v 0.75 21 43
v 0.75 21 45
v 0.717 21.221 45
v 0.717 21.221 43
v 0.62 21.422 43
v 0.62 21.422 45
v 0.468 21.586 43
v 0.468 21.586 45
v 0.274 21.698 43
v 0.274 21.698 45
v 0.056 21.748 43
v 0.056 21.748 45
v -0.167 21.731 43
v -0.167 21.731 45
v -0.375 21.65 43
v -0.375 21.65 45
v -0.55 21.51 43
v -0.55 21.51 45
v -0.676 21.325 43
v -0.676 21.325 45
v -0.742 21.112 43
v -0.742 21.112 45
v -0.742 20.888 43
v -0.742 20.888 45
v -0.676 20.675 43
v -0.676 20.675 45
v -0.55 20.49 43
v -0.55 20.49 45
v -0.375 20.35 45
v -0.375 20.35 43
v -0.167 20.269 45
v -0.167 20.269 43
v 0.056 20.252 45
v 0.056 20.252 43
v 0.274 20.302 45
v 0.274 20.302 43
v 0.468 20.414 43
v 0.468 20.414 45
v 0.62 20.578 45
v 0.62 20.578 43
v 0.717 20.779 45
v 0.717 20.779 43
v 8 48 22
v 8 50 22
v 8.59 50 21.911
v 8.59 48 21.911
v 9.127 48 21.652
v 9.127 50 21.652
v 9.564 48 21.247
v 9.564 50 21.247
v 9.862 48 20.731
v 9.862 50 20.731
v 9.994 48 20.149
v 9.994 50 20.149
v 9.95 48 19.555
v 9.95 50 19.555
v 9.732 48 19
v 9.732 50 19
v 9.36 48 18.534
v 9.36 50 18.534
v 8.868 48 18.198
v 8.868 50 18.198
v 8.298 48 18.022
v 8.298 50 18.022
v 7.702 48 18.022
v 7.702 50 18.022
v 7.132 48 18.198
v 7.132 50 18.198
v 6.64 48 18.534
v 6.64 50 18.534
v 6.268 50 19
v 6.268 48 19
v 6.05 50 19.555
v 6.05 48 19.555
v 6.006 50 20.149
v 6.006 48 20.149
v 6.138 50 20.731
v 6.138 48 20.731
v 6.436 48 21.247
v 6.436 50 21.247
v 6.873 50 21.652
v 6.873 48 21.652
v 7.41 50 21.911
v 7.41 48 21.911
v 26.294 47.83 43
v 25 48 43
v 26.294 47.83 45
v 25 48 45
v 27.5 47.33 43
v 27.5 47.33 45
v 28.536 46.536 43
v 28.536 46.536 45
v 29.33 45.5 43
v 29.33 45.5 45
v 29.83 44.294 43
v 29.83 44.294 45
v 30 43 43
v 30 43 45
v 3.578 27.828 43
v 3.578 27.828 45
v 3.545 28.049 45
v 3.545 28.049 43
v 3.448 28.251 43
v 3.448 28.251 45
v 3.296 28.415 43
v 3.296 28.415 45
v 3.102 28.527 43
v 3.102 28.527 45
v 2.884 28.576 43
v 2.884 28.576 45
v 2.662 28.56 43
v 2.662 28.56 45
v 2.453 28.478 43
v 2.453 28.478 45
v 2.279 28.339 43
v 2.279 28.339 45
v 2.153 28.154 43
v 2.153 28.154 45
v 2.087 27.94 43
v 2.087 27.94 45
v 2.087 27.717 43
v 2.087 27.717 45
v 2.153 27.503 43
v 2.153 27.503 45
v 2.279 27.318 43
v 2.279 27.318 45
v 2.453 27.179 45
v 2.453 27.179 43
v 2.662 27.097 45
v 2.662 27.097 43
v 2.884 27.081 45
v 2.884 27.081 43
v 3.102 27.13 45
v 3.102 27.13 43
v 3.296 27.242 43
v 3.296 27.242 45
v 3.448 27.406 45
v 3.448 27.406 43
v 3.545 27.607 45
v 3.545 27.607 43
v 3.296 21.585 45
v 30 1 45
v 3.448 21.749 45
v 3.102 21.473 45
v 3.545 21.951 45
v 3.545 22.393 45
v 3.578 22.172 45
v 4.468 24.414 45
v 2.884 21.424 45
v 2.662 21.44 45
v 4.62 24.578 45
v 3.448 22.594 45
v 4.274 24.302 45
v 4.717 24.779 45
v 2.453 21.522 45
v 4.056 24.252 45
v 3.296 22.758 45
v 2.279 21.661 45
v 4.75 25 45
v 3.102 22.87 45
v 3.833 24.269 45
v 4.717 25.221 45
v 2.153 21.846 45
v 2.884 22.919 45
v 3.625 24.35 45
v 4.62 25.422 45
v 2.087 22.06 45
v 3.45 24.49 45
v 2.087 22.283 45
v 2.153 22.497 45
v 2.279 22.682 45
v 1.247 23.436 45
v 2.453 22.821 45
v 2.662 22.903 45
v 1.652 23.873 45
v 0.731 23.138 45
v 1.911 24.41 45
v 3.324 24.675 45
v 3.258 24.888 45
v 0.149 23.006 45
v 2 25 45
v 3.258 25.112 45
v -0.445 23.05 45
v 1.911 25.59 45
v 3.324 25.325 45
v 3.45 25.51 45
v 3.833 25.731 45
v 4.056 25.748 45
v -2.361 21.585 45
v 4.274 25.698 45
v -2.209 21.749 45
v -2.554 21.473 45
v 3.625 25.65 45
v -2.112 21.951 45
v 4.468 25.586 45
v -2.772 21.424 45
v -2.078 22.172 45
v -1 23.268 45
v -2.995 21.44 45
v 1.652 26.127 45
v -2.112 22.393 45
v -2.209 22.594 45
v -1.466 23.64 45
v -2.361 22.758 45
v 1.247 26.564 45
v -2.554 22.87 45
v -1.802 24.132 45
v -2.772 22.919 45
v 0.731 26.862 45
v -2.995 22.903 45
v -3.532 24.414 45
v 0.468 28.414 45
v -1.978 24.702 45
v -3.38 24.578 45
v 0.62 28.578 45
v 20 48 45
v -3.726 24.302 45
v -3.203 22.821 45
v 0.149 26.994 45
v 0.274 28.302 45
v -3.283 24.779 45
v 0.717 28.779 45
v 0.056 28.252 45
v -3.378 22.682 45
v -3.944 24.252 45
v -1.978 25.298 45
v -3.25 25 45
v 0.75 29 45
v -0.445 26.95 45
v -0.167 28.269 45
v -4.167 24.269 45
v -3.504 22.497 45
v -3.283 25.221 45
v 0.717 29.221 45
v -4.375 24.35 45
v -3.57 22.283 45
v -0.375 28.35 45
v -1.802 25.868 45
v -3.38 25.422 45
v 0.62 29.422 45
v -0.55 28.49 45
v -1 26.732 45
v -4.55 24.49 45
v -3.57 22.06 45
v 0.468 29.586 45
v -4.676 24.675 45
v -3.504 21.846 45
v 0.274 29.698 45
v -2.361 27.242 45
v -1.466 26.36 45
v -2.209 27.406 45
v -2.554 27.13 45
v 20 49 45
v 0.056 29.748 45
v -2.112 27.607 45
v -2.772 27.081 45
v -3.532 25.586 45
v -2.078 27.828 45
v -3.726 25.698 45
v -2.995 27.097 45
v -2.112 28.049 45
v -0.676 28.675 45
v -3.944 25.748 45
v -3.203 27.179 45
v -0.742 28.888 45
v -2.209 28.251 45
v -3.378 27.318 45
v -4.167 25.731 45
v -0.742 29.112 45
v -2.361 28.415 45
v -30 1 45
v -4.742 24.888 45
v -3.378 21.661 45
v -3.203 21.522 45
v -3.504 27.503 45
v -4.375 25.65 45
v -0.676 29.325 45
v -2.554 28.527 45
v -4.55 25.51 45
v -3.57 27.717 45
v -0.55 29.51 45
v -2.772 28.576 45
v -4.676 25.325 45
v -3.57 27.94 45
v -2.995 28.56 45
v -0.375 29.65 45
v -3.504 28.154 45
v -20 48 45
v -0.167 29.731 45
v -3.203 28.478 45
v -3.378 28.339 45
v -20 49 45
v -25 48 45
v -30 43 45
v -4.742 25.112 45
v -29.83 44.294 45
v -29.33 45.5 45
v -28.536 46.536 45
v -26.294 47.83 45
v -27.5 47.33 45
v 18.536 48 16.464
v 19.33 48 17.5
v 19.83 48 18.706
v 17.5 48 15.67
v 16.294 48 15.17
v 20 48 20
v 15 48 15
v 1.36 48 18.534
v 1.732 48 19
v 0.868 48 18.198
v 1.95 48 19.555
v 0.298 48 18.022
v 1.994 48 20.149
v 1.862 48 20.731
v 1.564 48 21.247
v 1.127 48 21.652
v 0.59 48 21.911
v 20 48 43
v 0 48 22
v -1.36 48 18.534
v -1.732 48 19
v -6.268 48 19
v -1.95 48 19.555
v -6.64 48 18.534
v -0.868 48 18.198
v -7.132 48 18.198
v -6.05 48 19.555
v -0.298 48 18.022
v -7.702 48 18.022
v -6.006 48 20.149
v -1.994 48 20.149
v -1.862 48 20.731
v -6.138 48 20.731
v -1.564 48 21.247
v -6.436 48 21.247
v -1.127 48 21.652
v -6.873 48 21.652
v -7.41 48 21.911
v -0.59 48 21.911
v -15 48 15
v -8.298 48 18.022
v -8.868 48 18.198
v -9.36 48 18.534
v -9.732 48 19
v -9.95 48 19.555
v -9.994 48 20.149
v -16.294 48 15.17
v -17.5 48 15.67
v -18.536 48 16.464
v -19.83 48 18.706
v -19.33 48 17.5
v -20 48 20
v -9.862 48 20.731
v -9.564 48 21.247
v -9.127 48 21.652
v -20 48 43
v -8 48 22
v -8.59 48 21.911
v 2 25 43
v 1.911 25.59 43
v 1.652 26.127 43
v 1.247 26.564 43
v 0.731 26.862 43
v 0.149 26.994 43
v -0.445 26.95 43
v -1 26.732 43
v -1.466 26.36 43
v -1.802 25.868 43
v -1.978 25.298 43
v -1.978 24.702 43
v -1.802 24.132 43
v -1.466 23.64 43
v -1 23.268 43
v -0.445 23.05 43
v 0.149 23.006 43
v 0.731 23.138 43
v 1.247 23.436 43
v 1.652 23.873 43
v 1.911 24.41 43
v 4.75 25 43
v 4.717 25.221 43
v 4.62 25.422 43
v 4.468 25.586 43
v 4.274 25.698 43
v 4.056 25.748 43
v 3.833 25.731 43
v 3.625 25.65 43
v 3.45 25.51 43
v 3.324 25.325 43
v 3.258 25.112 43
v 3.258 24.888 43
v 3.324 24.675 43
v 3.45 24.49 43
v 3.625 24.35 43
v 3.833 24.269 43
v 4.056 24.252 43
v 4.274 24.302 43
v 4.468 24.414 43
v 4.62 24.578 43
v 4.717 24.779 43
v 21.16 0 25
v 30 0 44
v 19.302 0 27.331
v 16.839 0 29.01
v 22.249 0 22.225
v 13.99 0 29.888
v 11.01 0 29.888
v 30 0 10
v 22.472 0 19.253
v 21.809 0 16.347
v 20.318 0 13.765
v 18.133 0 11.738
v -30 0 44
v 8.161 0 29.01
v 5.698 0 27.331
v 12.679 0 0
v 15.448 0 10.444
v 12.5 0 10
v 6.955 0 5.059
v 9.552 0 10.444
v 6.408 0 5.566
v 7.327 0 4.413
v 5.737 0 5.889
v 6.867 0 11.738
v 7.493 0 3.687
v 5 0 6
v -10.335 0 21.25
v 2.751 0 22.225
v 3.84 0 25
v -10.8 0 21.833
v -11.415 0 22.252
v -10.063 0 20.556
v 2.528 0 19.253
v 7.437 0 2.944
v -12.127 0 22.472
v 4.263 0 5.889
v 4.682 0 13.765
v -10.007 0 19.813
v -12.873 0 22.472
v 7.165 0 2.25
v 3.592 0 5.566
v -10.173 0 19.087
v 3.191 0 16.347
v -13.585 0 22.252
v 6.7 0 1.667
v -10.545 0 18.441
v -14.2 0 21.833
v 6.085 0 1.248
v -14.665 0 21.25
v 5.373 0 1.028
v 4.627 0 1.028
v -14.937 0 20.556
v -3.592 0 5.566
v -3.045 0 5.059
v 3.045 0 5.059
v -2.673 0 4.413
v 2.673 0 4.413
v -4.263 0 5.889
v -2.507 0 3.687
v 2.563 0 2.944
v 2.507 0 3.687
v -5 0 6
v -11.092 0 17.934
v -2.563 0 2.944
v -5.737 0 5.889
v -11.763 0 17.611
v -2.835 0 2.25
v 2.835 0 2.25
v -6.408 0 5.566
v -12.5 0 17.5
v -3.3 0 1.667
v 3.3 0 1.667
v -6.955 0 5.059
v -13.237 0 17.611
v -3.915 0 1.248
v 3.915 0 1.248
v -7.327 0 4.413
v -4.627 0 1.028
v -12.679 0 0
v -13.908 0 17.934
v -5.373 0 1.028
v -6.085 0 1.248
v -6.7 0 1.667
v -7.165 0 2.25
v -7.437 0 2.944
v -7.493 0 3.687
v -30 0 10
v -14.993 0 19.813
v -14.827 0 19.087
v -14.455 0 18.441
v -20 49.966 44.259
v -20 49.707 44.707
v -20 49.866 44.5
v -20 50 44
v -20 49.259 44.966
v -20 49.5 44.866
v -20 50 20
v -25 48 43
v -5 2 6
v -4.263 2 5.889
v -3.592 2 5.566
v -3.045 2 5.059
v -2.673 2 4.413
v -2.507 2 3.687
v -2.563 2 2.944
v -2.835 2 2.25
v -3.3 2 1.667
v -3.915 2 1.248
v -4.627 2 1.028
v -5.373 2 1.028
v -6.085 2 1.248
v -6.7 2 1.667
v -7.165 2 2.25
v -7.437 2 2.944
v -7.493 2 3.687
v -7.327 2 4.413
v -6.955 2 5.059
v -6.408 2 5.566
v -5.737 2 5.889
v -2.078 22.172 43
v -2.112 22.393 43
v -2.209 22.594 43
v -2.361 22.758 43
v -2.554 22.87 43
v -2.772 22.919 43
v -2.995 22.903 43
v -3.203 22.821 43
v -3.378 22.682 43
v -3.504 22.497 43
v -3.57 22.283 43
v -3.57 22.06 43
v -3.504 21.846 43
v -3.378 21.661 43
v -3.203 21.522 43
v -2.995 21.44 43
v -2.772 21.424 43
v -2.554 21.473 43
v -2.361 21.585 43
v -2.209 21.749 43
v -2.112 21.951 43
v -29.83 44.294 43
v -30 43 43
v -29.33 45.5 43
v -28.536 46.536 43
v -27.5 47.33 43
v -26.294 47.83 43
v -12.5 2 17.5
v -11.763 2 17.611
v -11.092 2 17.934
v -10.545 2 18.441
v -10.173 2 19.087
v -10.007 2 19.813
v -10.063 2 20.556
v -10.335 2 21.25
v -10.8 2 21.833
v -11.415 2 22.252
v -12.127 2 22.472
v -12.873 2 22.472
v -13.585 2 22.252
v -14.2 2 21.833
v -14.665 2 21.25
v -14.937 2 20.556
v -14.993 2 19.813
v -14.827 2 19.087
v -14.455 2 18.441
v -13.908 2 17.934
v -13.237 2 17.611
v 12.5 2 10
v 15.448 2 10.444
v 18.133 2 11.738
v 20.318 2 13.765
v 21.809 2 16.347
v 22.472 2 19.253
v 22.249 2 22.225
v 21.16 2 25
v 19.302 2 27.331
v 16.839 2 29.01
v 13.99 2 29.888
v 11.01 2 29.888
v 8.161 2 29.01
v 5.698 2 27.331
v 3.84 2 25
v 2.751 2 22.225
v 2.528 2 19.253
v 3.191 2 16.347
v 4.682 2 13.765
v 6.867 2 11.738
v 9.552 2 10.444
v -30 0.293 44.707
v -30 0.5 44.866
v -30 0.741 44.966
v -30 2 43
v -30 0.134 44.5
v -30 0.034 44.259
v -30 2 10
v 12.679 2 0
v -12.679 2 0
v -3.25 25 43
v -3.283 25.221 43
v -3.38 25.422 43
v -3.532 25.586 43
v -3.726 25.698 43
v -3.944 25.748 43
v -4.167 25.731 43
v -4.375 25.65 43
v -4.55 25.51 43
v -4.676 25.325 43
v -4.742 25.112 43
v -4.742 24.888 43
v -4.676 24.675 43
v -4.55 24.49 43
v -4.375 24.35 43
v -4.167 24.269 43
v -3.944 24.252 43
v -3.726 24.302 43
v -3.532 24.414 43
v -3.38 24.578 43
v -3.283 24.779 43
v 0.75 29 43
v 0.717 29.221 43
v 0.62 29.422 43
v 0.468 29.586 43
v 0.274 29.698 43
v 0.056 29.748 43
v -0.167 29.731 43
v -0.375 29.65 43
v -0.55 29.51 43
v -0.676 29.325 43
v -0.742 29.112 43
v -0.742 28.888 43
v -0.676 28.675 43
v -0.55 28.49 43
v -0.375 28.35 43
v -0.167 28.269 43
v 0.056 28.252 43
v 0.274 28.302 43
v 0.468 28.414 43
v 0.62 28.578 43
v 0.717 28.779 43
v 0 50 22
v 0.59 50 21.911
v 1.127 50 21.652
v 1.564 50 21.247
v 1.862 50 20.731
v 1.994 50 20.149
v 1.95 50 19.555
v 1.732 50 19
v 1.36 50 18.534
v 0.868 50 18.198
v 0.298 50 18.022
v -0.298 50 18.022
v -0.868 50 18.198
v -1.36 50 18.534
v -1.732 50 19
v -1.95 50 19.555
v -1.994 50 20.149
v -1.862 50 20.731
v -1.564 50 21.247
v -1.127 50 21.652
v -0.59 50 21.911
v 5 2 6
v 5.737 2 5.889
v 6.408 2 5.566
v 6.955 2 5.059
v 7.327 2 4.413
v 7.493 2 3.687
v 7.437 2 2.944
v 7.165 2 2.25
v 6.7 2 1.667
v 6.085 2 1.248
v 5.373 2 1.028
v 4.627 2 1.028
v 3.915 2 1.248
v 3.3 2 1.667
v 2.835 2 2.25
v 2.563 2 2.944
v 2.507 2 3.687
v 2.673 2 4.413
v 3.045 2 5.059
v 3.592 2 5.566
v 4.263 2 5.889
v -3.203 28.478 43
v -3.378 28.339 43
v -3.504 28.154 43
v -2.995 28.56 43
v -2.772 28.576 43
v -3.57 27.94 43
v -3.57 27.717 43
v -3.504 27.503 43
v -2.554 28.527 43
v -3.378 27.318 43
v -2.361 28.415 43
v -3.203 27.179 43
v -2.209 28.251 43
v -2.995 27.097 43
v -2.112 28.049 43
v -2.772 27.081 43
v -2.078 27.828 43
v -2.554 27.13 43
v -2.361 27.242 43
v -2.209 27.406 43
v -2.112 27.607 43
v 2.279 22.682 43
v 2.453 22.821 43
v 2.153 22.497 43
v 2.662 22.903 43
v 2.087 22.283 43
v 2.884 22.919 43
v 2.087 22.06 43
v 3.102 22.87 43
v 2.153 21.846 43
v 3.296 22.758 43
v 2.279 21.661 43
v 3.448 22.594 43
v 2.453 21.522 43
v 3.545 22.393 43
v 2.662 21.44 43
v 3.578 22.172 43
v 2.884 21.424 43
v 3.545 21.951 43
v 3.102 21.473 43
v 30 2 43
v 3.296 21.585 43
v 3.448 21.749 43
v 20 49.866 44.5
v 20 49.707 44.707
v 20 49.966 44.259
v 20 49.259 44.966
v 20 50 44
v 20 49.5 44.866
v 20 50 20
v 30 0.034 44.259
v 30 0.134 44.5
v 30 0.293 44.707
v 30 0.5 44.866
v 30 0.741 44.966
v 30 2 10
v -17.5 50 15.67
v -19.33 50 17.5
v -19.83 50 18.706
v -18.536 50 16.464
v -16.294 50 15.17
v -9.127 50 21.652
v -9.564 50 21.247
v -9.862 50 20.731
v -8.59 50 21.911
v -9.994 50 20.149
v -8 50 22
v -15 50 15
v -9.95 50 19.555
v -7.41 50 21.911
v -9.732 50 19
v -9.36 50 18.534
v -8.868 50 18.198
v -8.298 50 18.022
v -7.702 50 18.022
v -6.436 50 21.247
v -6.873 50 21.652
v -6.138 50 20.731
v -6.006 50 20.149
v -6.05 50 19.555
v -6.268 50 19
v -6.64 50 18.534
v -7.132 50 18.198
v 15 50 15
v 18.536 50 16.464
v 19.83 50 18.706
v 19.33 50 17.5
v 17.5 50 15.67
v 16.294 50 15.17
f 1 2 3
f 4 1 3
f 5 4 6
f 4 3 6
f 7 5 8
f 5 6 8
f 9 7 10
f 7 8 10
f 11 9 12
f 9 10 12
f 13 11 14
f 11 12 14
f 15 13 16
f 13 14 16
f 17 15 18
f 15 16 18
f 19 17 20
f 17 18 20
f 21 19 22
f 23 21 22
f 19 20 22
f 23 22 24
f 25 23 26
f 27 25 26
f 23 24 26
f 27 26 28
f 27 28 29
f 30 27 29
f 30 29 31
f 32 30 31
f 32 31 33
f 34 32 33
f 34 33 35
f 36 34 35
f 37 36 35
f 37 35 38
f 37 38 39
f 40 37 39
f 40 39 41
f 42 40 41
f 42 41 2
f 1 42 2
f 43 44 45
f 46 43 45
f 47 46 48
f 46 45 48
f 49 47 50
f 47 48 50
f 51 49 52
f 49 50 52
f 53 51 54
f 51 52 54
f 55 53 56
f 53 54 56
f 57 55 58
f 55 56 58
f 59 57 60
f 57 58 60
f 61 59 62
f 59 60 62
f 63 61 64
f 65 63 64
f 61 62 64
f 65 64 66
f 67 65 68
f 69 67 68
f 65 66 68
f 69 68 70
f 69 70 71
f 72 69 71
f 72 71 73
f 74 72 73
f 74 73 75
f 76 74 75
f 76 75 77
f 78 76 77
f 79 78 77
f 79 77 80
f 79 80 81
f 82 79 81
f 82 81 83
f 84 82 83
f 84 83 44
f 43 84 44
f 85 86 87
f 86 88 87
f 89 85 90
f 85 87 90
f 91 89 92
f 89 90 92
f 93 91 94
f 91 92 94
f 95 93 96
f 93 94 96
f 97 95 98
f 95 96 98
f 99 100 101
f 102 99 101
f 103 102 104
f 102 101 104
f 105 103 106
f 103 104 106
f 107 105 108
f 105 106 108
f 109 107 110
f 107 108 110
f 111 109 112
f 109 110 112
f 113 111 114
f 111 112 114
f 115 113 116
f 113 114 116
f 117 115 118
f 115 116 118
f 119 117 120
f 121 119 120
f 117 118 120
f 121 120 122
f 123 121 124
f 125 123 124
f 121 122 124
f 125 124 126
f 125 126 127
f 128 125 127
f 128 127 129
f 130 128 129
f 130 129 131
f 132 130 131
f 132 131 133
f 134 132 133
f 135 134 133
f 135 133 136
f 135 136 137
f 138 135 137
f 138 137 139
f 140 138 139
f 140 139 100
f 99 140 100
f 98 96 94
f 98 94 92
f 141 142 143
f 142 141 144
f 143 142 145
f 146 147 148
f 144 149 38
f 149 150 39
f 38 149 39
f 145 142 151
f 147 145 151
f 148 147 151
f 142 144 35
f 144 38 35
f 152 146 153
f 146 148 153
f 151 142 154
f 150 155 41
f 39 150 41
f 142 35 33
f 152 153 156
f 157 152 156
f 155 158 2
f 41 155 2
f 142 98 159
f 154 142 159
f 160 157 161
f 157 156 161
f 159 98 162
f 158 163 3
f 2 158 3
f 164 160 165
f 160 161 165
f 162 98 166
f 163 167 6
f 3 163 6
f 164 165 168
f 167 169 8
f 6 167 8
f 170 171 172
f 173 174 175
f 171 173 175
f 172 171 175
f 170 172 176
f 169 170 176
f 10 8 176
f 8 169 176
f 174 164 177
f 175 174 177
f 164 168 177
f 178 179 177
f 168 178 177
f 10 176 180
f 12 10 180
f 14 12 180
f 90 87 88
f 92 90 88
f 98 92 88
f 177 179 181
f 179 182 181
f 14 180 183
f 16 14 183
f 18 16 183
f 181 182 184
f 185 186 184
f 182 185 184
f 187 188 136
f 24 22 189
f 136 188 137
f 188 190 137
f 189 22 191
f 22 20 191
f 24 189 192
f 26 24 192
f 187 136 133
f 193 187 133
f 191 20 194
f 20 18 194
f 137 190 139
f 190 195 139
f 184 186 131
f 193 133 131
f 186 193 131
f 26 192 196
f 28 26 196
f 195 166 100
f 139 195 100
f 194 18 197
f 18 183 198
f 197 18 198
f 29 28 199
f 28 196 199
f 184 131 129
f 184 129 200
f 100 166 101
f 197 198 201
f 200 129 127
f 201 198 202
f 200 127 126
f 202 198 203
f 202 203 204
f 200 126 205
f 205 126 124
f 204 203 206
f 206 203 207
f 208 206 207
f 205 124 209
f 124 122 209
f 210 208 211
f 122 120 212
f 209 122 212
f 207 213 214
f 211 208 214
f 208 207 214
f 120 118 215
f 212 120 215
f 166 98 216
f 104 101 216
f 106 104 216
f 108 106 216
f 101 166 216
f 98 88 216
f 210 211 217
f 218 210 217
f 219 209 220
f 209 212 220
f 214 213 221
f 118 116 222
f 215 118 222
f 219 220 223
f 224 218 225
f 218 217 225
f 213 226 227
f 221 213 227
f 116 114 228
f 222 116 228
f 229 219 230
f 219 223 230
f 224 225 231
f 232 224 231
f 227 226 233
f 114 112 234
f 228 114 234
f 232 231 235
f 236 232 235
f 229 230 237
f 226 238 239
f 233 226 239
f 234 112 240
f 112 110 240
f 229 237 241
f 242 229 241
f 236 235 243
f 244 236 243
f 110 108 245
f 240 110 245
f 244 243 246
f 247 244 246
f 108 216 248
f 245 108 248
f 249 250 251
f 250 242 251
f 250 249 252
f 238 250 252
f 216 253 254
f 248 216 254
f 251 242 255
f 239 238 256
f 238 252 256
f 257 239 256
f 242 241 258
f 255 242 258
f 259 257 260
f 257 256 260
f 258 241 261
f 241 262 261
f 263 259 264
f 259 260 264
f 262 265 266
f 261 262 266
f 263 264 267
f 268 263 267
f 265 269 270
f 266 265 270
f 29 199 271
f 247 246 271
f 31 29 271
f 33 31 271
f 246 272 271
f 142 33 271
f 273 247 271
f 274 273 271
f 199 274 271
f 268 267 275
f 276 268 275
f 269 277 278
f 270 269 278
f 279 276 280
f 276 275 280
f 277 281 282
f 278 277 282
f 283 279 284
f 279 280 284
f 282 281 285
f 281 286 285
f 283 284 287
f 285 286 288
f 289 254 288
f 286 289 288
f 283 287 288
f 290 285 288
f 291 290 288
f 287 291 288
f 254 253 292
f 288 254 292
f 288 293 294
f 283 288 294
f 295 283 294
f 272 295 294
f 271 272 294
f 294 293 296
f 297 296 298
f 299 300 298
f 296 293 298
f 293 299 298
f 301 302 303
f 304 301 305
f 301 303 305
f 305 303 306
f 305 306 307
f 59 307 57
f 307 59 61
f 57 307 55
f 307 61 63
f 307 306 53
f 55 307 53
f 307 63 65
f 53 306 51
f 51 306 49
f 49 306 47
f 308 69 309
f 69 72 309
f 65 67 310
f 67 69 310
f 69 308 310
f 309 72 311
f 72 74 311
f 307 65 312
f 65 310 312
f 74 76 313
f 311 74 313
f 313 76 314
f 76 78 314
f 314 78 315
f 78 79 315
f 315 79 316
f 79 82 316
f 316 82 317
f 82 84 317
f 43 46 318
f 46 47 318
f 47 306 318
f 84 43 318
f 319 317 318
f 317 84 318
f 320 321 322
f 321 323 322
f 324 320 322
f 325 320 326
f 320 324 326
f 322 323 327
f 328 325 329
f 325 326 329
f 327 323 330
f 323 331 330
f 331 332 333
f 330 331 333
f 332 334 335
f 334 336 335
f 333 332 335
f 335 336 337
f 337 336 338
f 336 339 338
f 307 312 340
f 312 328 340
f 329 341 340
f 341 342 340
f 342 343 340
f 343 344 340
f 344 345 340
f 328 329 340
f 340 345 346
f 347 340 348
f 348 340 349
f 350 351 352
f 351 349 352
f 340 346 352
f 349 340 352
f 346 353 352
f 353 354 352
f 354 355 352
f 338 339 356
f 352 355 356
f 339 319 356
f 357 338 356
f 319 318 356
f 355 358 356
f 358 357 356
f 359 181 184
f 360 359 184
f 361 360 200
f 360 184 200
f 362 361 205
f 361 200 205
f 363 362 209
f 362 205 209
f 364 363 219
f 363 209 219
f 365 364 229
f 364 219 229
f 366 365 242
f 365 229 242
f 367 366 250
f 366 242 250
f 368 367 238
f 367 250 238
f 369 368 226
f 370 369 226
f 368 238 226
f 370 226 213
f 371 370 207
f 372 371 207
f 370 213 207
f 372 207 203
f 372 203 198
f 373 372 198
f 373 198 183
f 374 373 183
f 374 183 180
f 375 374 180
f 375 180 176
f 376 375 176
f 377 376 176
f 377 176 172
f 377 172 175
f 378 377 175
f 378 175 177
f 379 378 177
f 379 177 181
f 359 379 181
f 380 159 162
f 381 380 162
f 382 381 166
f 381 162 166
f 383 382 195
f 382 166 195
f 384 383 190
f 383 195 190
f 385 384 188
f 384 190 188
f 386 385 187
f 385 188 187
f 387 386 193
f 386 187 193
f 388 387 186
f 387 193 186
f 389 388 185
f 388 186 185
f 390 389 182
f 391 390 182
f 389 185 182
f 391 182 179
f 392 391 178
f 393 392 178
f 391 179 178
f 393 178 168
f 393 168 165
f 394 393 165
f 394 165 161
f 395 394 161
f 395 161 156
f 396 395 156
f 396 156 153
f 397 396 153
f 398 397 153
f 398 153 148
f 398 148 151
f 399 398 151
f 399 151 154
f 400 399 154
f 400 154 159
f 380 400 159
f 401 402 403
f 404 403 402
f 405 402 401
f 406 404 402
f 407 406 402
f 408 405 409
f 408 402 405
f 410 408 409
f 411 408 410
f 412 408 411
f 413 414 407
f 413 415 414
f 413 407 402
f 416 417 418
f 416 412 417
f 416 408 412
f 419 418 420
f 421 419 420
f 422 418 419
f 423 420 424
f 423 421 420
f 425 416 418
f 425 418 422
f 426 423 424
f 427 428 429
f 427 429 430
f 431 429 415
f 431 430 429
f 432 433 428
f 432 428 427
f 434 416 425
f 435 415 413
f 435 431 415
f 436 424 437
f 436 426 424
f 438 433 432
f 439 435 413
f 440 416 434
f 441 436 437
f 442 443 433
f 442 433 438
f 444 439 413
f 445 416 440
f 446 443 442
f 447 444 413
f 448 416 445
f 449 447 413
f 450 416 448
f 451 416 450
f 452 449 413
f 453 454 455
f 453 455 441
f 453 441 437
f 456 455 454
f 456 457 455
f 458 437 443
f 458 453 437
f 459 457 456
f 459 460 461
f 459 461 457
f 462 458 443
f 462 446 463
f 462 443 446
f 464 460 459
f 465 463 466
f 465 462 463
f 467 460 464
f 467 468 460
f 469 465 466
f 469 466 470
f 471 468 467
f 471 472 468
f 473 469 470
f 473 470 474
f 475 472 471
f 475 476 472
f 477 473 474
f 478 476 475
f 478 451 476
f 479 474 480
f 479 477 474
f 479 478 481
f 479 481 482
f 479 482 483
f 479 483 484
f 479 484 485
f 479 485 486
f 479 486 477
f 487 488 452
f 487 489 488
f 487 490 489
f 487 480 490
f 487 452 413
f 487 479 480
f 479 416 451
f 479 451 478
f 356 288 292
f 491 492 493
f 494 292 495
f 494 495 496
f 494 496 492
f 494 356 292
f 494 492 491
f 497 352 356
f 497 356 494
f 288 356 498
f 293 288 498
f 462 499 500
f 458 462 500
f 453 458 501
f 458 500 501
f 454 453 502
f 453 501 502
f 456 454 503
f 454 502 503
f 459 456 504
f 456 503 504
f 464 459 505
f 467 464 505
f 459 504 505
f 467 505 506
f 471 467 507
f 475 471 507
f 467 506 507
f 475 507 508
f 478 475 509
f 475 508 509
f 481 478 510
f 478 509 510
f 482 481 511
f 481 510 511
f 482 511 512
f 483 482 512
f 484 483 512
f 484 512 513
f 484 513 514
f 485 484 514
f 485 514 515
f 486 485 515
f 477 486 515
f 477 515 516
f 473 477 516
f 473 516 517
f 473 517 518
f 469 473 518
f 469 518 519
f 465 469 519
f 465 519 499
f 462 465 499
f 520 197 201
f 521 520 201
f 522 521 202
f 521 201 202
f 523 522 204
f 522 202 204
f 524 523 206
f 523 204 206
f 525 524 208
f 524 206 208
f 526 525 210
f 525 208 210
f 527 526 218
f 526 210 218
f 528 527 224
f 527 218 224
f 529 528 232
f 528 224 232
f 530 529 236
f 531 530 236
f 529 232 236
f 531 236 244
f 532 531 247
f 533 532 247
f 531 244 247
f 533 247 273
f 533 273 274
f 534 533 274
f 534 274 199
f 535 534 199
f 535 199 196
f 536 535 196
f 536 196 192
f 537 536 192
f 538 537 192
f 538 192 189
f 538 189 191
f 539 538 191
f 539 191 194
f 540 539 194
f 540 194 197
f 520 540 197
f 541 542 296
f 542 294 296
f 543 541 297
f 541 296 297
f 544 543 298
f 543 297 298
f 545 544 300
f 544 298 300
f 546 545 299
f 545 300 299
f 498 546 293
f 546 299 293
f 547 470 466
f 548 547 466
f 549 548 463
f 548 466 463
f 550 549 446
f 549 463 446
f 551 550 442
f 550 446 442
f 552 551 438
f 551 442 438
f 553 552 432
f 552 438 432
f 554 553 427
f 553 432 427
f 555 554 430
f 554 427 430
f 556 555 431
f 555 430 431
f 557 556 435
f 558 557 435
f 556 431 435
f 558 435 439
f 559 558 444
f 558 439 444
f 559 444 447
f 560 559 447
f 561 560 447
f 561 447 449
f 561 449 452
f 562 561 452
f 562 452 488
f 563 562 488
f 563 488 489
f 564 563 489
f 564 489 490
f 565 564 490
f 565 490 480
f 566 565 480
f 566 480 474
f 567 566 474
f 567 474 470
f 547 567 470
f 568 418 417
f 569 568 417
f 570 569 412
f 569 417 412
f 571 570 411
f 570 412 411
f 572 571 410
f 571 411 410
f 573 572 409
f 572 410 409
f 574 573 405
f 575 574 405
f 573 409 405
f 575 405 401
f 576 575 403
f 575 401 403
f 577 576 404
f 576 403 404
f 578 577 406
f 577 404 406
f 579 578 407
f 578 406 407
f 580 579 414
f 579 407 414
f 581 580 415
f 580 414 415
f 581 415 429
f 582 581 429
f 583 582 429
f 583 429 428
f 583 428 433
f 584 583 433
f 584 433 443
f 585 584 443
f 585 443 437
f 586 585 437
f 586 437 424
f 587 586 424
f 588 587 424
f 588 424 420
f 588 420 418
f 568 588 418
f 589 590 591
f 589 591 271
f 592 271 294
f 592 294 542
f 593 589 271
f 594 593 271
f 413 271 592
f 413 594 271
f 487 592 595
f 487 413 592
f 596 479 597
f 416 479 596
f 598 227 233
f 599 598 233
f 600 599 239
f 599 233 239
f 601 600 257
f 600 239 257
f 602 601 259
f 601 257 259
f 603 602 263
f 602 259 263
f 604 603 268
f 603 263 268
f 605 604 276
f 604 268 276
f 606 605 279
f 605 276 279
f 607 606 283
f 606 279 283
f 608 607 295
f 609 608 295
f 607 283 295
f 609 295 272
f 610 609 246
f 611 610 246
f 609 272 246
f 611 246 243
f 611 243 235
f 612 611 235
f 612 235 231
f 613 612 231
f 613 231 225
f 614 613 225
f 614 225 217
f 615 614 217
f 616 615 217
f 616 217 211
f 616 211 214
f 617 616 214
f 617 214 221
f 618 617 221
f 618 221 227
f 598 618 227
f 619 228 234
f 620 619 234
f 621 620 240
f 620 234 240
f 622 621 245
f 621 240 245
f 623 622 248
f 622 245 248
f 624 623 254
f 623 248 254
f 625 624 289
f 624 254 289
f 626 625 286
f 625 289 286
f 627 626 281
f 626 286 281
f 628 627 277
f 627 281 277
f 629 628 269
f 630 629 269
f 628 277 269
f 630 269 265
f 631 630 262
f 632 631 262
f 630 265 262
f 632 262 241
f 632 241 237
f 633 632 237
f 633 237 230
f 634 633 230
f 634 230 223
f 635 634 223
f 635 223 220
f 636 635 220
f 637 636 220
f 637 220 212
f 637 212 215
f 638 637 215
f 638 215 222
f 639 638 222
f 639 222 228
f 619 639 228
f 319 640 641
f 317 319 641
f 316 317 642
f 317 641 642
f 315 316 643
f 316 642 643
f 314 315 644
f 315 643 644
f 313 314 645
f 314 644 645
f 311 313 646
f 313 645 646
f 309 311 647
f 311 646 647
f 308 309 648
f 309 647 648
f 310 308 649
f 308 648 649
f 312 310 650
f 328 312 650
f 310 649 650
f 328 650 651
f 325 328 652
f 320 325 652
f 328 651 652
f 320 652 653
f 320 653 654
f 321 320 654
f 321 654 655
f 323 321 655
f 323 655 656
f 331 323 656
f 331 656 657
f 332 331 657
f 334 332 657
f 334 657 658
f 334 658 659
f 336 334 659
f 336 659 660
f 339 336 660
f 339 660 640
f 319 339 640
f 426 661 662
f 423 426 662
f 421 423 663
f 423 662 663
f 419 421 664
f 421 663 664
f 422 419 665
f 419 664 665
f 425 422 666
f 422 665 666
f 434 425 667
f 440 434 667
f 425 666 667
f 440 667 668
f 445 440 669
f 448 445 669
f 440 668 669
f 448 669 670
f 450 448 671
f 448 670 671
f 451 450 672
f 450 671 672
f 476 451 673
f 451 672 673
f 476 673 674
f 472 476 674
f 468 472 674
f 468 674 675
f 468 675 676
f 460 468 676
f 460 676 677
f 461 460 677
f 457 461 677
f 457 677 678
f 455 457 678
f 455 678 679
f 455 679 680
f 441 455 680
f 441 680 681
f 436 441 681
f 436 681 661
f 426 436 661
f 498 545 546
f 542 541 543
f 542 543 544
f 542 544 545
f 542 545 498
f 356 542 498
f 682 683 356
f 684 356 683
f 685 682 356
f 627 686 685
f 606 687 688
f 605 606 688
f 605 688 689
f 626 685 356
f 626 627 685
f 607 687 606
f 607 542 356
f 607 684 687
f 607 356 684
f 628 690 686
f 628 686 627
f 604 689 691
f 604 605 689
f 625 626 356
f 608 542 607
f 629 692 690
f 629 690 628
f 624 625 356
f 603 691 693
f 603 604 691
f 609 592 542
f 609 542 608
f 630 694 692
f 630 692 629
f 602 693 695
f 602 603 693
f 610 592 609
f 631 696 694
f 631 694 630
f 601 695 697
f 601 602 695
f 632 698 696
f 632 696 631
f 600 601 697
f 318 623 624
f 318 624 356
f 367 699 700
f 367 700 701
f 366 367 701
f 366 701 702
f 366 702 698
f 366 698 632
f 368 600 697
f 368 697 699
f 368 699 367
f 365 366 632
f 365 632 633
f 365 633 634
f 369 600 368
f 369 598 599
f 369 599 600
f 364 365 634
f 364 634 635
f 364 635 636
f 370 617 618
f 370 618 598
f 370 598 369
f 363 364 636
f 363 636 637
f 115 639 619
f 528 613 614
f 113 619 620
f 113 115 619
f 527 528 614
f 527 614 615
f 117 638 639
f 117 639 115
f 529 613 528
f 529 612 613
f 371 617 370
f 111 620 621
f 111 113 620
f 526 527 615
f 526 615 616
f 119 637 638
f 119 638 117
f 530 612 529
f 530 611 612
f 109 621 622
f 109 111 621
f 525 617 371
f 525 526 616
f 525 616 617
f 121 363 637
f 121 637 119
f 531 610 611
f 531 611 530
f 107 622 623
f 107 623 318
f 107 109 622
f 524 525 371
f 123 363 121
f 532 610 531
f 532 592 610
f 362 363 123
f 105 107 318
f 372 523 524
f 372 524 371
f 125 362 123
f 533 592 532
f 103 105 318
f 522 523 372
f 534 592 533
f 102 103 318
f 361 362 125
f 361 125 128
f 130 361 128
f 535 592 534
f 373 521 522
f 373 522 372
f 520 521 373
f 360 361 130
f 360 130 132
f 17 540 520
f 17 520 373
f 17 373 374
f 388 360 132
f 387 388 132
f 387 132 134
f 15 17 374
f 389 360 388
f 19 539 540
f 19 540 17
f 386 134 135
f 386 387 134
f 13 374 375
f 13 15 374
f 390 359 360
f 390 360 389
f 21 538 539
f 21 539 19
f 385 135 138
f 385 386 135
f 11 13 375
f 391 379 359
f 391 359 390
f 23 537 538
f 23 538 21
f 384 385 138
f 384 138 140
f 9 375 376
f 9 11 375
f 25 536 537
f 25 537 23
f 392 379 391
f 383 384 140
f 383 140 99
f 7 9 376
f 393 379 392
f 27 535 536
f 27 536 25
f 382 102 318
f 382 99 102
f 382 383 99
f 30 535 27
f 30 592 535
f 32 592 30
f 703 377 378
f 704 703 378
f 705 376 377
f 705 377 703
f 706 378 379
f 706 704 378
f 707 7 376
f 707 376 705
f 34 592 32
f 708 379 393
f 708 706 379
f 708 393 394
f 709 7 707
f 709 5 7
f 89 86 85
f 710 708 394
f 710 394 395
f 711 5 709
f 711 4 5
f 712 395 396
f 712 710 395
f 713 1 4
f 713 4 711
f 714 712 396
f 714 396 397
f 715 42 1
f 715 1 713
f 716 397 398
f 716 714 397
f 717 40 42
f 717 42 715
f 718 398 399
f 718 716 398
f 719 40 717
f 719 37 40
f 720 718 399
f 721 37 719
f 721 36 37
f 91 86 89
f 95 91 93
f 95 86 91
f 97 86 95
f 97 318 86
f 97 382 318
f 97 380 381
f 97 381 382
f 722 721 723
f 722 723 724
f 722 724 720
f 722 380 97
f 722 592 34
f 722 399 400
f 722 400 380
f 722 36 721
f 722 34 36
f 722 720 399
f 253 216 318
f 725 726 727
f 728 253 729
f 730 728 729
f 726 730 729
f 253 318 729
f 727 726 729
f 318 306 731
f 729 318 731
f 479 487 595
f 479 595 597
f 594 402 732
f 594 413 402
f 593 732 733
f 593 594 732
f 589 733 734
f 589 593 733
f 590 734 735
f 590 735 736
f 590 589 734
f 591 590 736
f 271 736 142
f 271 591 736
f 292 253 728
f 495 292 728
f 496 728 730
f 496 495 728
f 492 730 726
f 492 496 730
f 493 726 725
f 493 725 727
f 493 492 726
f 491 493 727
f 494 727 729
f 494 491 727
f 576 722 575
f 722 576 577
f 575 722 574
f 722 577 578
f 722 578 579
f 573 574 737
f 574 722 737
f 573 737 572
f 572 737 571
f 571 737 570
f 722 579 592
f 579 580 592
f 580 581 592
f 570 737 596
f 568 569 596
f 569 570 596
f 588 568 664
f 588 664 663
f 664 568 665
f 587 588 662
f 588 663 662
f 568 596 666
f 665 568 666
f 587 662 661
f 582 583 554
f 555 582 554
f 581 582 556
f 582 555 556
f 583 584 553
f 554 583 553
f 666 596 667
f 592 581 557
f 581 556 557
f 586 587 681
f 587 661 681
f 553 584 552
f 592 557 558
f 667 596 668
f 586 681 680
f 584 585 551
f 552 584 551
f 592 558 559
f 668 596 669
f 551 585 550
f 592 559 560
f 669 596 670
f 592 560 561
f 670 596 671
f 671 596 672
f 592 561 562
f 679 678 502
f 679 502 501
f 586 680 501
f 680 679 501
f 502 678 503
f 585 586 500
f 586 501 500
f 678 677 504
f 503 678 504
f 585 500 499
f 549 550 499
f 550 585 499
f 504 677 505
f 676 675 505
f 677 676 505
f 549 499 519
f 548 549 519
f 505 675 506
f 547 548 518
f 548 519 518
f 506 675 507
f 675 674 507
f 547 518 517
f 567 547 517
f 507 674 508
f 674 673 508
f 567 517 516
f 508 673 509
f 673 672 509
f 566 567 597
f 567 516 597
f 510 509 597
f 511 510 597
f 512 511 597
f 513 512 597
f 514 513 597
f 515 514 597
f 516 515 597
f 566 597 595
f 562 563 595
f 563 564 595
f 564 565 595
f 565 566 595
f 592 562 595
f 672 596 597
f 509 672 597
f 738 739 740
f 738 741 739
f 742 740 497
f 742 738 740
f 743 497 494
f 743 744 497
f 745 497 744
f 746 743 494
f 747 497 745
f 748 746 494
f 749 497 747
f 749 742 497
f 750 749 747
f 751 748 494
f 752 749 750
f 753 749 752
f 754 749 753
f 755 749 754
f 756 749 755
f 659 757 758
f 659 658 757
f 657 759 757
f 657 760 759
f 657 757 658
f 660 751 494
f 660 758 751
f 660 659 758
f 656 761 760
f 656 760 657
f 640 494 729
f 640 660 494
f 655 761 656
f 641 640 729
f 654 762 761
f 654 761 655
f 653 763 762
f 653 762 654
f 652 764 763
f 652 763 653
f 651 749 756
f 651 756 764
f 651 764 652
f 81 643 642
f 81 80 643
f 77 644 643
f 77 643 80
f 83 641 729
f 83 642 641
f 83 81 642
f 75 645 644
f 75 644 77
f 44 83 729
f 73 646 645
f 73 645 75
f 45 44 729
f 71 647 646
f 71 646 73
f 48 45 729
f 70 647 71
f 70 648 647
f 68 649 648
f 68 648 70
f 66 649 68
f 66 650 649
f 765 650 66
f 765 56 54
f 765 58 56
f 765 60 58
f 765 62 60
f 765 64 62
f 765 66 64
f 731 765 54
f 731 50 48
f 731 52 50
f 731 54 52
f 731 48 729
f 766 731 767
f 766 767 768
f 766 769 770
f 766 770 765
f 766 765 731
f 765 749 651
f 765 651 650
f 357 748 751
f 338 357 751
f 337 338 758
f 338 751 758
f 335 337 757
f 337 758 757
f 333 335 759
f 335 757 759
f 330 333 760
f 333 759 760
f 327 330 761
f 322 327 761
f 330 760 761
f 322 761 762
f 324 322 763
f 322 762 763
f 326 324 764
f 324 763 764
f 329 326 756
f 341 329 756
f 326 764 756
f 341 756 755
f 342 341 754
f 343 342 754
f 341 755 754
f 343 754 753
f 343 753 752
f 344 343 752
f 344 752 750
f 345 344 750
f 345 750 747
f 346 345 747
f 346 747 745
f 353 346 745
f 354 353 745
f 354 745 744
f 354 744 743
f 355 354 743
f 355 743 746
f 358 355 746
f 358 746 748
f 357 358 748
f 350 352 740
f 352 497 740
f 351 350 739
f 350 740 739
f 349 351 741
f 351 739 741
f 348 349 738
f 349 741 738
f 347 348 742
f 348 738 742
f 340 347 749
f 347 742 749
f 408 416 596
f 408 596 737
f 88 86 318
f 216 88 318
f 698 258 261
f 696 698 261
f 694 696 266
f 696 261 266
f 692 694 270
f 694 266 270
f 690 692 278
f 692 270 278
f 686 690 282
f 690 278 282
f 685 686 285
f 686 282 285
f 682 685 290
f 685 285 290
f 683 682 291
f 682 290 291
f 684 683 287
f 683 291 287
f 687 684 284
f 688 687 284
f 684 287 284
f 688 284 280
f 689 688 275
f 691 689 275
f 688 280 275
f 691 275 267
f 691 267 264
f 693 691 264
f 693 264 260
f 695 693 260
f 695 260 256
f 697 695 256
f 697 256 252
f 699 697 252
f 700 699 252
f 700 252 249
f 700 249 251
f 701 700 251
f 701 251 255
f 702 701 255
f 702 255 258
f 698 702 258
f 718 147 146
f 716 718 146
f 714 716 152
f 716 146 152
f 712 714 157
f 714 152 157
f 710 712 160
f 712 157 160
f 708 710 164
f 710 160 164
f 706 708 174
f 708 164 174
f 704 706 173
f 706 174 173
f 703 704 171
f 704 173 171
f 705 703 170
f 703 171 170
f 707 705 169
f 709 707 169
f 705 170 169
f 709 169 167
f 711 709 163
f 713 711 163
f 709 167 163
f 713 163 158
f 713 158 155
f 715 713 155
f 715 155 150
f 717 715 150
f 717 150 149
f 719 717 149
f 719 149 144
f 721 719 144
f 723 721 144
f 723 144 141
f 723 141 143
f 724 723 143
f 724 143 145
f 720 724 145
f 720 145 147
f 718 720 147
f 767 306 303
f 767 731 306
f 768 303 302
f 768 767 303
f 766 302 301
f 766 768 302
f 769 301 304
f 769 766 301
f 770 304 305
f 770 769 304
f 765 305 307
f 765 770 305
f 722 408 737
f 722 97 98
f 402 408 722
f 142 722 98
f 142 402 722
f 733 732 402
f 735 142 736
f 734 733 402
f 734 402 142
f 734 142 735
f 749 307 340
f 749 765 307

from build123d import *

# Parameters (mm, degrees)
EXTRUDE_1_DEPTH     = 2
EXTRUDE_START       = -2
SKETCH_2_W          = 60
SKETCH_2_H          = 2
EXTRUDE_2_DEPTH     = 50
FILLET_1_R          = 1
SKETCH_3_W          = 20
SKETCH_3_H          = 2
EXTRUDE_4_DEPTH     = 30
SKETCH_3_3_W        = 10
SKETCH_3_3_H        = 2
CUT_EXTRUDE_1_DEPTH = 30
FILLET_4_R          = 5
FILLET_5_R          = 1
SKETCH_4_R          = 2
CUT_EXTRUDE_2_DEPTH = 30
FILLET_6_R          = 5
SKETCH_5_R          = 2.5
SKETCH_5_R_2        = 10
CUT_EXTRUDE_4_DEPTH = 30
SKETCH_6_R          = 2.5
CUT_EXTRUDE_5_DEPTH = 10
SKETCH_7_R          = 2
SKETCH_7_R_2        = 0.75
CUT_EXTRUDE_6_DEPTH = 10


with BuildPart() as part:
    # 草图1 → 凸台-拉伸1 (new body)
    with BuildSketch(Plane(origin=(0, 0, 0), x_dir=(1, 0, 0), z_dir=(0, 1, 0))):
        Polygon((-12.679491924, 0), (12.679491924, 0), (30, -10), (30, -45), (-30, -45), (-30, -10), align=None)
    extrude(amount=EXTRUDE_1_DEPTH)

    # 草图2 → 凸台-拉伸2 (add)
    with BuildSketch(Plane(origin=(0, 2, 0), x_dir=(1, 0, 0), z_dir=(0, 1, 0)).offset(EXTRUDE_START)):
        with Locations((0, -44)):
            Rectangle(SKETCH_2_W, SKETCH_2_H)
    extrude(amount=EXTRUDE_2_DEPTH)

    # 圆角1
    fillet_1_edges = [part.edges().sort_by_distance(p)[0] for p in [
        (0, 0, 45),
    ]]
    fillet(fillet_1_edges, radius=FILLET_1_R)

    # 草图3 → 凸台-拉伸4 (add)
    with BuildSketch(Plane(origin=(0, 0, 43), x_dir=(-1, 0, 0), z_dir=(0, 0, -1)).offset(EXTRUDE_START)):
        with Locations((-10, 49)):
            Rectangle(SKETCH_3_W, SKETCH_3_H)
        with Locations((10, 49)):
            Rectangle(SKETCH_3_W, SKETCH_3_H)
    extrude(amount=EXTRUDE_4_DEPTH)

    # 草图3<3> → 切除-拉伸1 (cut)
    with BuildSketch(Plane(origin=(0, 0, 43), x_dir=(-1, 0, 0), z_dir=(0, 0, -1))):
        with Locations((-25, 49)):
            Rectangle(SKETCH_3_3_W, SKETCH_3_3_H)
        with Locations((25, 49)):
            Rectangle(SKETCH_3_3_W, SKETCH_3_3_H)
    extrude(amount=-CUT_EXTRUDE_1_DEPTH, mode=Mode.SUBTRACT)

    # 圆角4
    fillet_4_edges = [part.edges().sort_by_distance(p)[0] for p in [
        (30, 48, 44),
        (-30, 48, 44),
    ]]
    fillet(fillet_4_edges, radius=FILLET_4_R)

    # 圆角5
    fillet_5_edges = [part.edges().sort_by_distance(p)[0] for p in [
        (0, 50, 45),
    ]]
    fillet(fillet_5_edges, radius=FILLET_5_R)

    # 草图4 → 切除-拉伸2 (cut)
    with BuildSketch(Plane(origin=(0, 50, 0), x_dir=(1, 0, 0), z_dir=(0, 1, 0))):
        with Locations(Location((0, -20, 0), (0, 0, 270))):
            Circle(SKETCH_4_R)
        with Locations(Location((-8, -20, 0), (0, 0, 270))):
            Circle(SKETCH_4_R)
        with Locations(Location((8, -20, 0), (0, 0, 270))):
            Circle(SKETCH_4_R)
    extrude(amount=-CUT_EXTRUDE_2_DEPTH, mode=Mode.SUBTRACT)

    # 圆角6
    fillet_6_edges = [part.edges().sort_by_distance(p)[0] for p in [
        (-20, 49, 15),
        (20, 49, 15),
    ]]
    fillet(fillet_6_edges, radius=FILLET_6_R)

    # 草图5 → 切除-拉伸4 (cut)
    with BuildSketch(Plane.XZ):
        with Locations(Location((-12.5, 20, 0), (0, 0, 270))):
            Circle(SKETCH_5_R)
        with Locations(Location((12.5, 20, 0), (0, 0, 270))):
            Circle(SKETCH_5_R_2)
    extrude(amount=-CUT_EXTRUDE_4_DEPTH, mode=Mode.SUBTRACT)

    # 草图6 → 切除-拉伸5 (cut)
    with BuildSketch(Plane(origin=(0, 2, 0), x_dir=(1, 0, 0), z_dir=(0, 1, 0))):
        with Locations(Location((5, -3.5, 0), (0, 0, 270))):
            Circle(SKETCH_6_R)
        with Locations(Location((-5, -3.5, 0), (0, 0, 270))):
            Circle(SKETCH_6_R)
    extrude(amount=-CUT_EXTRUDE_5_DEPTH, mode=Mode.SUBTRACT)

    # 草图7 → 切除-拉伸6 (cut)
    with BuildSketch(Plane.XY.offset(45)):
        with Locations((0, 25)):
            Circle(SKETCH_7_R)
        with Locations((0, 29)):
            Circle(SKETCH_7_R_2)
        with Locations((2.828427125, 27.828427125)):
            Circle(SKETCH_7_R_2)
        with Locations((4, 25)):
            Circle(SKETCH_7_R_2)
        with Locations((2.828427125, 22.171572875)):
            Circle(SKETCH_7_R_2)
        with Locations((0, 21)):
            Circle(SKETCH_7_R_2)
        with Locations((-2.828427125, 22.171572875)):
            Circle(SKETCH_7_R_2)
        with Locations((-4, 25)):
            Circle(SKETCH_7_R_2)
        with Locations((-2.828427125, 27.828427125)):
            Circle(SKETCH_7_R_2)
    extrude(amount=-CUT_EXTRUDE_6_DEPTH, mode=Mode.SUBTRACT)


solid = part.part
